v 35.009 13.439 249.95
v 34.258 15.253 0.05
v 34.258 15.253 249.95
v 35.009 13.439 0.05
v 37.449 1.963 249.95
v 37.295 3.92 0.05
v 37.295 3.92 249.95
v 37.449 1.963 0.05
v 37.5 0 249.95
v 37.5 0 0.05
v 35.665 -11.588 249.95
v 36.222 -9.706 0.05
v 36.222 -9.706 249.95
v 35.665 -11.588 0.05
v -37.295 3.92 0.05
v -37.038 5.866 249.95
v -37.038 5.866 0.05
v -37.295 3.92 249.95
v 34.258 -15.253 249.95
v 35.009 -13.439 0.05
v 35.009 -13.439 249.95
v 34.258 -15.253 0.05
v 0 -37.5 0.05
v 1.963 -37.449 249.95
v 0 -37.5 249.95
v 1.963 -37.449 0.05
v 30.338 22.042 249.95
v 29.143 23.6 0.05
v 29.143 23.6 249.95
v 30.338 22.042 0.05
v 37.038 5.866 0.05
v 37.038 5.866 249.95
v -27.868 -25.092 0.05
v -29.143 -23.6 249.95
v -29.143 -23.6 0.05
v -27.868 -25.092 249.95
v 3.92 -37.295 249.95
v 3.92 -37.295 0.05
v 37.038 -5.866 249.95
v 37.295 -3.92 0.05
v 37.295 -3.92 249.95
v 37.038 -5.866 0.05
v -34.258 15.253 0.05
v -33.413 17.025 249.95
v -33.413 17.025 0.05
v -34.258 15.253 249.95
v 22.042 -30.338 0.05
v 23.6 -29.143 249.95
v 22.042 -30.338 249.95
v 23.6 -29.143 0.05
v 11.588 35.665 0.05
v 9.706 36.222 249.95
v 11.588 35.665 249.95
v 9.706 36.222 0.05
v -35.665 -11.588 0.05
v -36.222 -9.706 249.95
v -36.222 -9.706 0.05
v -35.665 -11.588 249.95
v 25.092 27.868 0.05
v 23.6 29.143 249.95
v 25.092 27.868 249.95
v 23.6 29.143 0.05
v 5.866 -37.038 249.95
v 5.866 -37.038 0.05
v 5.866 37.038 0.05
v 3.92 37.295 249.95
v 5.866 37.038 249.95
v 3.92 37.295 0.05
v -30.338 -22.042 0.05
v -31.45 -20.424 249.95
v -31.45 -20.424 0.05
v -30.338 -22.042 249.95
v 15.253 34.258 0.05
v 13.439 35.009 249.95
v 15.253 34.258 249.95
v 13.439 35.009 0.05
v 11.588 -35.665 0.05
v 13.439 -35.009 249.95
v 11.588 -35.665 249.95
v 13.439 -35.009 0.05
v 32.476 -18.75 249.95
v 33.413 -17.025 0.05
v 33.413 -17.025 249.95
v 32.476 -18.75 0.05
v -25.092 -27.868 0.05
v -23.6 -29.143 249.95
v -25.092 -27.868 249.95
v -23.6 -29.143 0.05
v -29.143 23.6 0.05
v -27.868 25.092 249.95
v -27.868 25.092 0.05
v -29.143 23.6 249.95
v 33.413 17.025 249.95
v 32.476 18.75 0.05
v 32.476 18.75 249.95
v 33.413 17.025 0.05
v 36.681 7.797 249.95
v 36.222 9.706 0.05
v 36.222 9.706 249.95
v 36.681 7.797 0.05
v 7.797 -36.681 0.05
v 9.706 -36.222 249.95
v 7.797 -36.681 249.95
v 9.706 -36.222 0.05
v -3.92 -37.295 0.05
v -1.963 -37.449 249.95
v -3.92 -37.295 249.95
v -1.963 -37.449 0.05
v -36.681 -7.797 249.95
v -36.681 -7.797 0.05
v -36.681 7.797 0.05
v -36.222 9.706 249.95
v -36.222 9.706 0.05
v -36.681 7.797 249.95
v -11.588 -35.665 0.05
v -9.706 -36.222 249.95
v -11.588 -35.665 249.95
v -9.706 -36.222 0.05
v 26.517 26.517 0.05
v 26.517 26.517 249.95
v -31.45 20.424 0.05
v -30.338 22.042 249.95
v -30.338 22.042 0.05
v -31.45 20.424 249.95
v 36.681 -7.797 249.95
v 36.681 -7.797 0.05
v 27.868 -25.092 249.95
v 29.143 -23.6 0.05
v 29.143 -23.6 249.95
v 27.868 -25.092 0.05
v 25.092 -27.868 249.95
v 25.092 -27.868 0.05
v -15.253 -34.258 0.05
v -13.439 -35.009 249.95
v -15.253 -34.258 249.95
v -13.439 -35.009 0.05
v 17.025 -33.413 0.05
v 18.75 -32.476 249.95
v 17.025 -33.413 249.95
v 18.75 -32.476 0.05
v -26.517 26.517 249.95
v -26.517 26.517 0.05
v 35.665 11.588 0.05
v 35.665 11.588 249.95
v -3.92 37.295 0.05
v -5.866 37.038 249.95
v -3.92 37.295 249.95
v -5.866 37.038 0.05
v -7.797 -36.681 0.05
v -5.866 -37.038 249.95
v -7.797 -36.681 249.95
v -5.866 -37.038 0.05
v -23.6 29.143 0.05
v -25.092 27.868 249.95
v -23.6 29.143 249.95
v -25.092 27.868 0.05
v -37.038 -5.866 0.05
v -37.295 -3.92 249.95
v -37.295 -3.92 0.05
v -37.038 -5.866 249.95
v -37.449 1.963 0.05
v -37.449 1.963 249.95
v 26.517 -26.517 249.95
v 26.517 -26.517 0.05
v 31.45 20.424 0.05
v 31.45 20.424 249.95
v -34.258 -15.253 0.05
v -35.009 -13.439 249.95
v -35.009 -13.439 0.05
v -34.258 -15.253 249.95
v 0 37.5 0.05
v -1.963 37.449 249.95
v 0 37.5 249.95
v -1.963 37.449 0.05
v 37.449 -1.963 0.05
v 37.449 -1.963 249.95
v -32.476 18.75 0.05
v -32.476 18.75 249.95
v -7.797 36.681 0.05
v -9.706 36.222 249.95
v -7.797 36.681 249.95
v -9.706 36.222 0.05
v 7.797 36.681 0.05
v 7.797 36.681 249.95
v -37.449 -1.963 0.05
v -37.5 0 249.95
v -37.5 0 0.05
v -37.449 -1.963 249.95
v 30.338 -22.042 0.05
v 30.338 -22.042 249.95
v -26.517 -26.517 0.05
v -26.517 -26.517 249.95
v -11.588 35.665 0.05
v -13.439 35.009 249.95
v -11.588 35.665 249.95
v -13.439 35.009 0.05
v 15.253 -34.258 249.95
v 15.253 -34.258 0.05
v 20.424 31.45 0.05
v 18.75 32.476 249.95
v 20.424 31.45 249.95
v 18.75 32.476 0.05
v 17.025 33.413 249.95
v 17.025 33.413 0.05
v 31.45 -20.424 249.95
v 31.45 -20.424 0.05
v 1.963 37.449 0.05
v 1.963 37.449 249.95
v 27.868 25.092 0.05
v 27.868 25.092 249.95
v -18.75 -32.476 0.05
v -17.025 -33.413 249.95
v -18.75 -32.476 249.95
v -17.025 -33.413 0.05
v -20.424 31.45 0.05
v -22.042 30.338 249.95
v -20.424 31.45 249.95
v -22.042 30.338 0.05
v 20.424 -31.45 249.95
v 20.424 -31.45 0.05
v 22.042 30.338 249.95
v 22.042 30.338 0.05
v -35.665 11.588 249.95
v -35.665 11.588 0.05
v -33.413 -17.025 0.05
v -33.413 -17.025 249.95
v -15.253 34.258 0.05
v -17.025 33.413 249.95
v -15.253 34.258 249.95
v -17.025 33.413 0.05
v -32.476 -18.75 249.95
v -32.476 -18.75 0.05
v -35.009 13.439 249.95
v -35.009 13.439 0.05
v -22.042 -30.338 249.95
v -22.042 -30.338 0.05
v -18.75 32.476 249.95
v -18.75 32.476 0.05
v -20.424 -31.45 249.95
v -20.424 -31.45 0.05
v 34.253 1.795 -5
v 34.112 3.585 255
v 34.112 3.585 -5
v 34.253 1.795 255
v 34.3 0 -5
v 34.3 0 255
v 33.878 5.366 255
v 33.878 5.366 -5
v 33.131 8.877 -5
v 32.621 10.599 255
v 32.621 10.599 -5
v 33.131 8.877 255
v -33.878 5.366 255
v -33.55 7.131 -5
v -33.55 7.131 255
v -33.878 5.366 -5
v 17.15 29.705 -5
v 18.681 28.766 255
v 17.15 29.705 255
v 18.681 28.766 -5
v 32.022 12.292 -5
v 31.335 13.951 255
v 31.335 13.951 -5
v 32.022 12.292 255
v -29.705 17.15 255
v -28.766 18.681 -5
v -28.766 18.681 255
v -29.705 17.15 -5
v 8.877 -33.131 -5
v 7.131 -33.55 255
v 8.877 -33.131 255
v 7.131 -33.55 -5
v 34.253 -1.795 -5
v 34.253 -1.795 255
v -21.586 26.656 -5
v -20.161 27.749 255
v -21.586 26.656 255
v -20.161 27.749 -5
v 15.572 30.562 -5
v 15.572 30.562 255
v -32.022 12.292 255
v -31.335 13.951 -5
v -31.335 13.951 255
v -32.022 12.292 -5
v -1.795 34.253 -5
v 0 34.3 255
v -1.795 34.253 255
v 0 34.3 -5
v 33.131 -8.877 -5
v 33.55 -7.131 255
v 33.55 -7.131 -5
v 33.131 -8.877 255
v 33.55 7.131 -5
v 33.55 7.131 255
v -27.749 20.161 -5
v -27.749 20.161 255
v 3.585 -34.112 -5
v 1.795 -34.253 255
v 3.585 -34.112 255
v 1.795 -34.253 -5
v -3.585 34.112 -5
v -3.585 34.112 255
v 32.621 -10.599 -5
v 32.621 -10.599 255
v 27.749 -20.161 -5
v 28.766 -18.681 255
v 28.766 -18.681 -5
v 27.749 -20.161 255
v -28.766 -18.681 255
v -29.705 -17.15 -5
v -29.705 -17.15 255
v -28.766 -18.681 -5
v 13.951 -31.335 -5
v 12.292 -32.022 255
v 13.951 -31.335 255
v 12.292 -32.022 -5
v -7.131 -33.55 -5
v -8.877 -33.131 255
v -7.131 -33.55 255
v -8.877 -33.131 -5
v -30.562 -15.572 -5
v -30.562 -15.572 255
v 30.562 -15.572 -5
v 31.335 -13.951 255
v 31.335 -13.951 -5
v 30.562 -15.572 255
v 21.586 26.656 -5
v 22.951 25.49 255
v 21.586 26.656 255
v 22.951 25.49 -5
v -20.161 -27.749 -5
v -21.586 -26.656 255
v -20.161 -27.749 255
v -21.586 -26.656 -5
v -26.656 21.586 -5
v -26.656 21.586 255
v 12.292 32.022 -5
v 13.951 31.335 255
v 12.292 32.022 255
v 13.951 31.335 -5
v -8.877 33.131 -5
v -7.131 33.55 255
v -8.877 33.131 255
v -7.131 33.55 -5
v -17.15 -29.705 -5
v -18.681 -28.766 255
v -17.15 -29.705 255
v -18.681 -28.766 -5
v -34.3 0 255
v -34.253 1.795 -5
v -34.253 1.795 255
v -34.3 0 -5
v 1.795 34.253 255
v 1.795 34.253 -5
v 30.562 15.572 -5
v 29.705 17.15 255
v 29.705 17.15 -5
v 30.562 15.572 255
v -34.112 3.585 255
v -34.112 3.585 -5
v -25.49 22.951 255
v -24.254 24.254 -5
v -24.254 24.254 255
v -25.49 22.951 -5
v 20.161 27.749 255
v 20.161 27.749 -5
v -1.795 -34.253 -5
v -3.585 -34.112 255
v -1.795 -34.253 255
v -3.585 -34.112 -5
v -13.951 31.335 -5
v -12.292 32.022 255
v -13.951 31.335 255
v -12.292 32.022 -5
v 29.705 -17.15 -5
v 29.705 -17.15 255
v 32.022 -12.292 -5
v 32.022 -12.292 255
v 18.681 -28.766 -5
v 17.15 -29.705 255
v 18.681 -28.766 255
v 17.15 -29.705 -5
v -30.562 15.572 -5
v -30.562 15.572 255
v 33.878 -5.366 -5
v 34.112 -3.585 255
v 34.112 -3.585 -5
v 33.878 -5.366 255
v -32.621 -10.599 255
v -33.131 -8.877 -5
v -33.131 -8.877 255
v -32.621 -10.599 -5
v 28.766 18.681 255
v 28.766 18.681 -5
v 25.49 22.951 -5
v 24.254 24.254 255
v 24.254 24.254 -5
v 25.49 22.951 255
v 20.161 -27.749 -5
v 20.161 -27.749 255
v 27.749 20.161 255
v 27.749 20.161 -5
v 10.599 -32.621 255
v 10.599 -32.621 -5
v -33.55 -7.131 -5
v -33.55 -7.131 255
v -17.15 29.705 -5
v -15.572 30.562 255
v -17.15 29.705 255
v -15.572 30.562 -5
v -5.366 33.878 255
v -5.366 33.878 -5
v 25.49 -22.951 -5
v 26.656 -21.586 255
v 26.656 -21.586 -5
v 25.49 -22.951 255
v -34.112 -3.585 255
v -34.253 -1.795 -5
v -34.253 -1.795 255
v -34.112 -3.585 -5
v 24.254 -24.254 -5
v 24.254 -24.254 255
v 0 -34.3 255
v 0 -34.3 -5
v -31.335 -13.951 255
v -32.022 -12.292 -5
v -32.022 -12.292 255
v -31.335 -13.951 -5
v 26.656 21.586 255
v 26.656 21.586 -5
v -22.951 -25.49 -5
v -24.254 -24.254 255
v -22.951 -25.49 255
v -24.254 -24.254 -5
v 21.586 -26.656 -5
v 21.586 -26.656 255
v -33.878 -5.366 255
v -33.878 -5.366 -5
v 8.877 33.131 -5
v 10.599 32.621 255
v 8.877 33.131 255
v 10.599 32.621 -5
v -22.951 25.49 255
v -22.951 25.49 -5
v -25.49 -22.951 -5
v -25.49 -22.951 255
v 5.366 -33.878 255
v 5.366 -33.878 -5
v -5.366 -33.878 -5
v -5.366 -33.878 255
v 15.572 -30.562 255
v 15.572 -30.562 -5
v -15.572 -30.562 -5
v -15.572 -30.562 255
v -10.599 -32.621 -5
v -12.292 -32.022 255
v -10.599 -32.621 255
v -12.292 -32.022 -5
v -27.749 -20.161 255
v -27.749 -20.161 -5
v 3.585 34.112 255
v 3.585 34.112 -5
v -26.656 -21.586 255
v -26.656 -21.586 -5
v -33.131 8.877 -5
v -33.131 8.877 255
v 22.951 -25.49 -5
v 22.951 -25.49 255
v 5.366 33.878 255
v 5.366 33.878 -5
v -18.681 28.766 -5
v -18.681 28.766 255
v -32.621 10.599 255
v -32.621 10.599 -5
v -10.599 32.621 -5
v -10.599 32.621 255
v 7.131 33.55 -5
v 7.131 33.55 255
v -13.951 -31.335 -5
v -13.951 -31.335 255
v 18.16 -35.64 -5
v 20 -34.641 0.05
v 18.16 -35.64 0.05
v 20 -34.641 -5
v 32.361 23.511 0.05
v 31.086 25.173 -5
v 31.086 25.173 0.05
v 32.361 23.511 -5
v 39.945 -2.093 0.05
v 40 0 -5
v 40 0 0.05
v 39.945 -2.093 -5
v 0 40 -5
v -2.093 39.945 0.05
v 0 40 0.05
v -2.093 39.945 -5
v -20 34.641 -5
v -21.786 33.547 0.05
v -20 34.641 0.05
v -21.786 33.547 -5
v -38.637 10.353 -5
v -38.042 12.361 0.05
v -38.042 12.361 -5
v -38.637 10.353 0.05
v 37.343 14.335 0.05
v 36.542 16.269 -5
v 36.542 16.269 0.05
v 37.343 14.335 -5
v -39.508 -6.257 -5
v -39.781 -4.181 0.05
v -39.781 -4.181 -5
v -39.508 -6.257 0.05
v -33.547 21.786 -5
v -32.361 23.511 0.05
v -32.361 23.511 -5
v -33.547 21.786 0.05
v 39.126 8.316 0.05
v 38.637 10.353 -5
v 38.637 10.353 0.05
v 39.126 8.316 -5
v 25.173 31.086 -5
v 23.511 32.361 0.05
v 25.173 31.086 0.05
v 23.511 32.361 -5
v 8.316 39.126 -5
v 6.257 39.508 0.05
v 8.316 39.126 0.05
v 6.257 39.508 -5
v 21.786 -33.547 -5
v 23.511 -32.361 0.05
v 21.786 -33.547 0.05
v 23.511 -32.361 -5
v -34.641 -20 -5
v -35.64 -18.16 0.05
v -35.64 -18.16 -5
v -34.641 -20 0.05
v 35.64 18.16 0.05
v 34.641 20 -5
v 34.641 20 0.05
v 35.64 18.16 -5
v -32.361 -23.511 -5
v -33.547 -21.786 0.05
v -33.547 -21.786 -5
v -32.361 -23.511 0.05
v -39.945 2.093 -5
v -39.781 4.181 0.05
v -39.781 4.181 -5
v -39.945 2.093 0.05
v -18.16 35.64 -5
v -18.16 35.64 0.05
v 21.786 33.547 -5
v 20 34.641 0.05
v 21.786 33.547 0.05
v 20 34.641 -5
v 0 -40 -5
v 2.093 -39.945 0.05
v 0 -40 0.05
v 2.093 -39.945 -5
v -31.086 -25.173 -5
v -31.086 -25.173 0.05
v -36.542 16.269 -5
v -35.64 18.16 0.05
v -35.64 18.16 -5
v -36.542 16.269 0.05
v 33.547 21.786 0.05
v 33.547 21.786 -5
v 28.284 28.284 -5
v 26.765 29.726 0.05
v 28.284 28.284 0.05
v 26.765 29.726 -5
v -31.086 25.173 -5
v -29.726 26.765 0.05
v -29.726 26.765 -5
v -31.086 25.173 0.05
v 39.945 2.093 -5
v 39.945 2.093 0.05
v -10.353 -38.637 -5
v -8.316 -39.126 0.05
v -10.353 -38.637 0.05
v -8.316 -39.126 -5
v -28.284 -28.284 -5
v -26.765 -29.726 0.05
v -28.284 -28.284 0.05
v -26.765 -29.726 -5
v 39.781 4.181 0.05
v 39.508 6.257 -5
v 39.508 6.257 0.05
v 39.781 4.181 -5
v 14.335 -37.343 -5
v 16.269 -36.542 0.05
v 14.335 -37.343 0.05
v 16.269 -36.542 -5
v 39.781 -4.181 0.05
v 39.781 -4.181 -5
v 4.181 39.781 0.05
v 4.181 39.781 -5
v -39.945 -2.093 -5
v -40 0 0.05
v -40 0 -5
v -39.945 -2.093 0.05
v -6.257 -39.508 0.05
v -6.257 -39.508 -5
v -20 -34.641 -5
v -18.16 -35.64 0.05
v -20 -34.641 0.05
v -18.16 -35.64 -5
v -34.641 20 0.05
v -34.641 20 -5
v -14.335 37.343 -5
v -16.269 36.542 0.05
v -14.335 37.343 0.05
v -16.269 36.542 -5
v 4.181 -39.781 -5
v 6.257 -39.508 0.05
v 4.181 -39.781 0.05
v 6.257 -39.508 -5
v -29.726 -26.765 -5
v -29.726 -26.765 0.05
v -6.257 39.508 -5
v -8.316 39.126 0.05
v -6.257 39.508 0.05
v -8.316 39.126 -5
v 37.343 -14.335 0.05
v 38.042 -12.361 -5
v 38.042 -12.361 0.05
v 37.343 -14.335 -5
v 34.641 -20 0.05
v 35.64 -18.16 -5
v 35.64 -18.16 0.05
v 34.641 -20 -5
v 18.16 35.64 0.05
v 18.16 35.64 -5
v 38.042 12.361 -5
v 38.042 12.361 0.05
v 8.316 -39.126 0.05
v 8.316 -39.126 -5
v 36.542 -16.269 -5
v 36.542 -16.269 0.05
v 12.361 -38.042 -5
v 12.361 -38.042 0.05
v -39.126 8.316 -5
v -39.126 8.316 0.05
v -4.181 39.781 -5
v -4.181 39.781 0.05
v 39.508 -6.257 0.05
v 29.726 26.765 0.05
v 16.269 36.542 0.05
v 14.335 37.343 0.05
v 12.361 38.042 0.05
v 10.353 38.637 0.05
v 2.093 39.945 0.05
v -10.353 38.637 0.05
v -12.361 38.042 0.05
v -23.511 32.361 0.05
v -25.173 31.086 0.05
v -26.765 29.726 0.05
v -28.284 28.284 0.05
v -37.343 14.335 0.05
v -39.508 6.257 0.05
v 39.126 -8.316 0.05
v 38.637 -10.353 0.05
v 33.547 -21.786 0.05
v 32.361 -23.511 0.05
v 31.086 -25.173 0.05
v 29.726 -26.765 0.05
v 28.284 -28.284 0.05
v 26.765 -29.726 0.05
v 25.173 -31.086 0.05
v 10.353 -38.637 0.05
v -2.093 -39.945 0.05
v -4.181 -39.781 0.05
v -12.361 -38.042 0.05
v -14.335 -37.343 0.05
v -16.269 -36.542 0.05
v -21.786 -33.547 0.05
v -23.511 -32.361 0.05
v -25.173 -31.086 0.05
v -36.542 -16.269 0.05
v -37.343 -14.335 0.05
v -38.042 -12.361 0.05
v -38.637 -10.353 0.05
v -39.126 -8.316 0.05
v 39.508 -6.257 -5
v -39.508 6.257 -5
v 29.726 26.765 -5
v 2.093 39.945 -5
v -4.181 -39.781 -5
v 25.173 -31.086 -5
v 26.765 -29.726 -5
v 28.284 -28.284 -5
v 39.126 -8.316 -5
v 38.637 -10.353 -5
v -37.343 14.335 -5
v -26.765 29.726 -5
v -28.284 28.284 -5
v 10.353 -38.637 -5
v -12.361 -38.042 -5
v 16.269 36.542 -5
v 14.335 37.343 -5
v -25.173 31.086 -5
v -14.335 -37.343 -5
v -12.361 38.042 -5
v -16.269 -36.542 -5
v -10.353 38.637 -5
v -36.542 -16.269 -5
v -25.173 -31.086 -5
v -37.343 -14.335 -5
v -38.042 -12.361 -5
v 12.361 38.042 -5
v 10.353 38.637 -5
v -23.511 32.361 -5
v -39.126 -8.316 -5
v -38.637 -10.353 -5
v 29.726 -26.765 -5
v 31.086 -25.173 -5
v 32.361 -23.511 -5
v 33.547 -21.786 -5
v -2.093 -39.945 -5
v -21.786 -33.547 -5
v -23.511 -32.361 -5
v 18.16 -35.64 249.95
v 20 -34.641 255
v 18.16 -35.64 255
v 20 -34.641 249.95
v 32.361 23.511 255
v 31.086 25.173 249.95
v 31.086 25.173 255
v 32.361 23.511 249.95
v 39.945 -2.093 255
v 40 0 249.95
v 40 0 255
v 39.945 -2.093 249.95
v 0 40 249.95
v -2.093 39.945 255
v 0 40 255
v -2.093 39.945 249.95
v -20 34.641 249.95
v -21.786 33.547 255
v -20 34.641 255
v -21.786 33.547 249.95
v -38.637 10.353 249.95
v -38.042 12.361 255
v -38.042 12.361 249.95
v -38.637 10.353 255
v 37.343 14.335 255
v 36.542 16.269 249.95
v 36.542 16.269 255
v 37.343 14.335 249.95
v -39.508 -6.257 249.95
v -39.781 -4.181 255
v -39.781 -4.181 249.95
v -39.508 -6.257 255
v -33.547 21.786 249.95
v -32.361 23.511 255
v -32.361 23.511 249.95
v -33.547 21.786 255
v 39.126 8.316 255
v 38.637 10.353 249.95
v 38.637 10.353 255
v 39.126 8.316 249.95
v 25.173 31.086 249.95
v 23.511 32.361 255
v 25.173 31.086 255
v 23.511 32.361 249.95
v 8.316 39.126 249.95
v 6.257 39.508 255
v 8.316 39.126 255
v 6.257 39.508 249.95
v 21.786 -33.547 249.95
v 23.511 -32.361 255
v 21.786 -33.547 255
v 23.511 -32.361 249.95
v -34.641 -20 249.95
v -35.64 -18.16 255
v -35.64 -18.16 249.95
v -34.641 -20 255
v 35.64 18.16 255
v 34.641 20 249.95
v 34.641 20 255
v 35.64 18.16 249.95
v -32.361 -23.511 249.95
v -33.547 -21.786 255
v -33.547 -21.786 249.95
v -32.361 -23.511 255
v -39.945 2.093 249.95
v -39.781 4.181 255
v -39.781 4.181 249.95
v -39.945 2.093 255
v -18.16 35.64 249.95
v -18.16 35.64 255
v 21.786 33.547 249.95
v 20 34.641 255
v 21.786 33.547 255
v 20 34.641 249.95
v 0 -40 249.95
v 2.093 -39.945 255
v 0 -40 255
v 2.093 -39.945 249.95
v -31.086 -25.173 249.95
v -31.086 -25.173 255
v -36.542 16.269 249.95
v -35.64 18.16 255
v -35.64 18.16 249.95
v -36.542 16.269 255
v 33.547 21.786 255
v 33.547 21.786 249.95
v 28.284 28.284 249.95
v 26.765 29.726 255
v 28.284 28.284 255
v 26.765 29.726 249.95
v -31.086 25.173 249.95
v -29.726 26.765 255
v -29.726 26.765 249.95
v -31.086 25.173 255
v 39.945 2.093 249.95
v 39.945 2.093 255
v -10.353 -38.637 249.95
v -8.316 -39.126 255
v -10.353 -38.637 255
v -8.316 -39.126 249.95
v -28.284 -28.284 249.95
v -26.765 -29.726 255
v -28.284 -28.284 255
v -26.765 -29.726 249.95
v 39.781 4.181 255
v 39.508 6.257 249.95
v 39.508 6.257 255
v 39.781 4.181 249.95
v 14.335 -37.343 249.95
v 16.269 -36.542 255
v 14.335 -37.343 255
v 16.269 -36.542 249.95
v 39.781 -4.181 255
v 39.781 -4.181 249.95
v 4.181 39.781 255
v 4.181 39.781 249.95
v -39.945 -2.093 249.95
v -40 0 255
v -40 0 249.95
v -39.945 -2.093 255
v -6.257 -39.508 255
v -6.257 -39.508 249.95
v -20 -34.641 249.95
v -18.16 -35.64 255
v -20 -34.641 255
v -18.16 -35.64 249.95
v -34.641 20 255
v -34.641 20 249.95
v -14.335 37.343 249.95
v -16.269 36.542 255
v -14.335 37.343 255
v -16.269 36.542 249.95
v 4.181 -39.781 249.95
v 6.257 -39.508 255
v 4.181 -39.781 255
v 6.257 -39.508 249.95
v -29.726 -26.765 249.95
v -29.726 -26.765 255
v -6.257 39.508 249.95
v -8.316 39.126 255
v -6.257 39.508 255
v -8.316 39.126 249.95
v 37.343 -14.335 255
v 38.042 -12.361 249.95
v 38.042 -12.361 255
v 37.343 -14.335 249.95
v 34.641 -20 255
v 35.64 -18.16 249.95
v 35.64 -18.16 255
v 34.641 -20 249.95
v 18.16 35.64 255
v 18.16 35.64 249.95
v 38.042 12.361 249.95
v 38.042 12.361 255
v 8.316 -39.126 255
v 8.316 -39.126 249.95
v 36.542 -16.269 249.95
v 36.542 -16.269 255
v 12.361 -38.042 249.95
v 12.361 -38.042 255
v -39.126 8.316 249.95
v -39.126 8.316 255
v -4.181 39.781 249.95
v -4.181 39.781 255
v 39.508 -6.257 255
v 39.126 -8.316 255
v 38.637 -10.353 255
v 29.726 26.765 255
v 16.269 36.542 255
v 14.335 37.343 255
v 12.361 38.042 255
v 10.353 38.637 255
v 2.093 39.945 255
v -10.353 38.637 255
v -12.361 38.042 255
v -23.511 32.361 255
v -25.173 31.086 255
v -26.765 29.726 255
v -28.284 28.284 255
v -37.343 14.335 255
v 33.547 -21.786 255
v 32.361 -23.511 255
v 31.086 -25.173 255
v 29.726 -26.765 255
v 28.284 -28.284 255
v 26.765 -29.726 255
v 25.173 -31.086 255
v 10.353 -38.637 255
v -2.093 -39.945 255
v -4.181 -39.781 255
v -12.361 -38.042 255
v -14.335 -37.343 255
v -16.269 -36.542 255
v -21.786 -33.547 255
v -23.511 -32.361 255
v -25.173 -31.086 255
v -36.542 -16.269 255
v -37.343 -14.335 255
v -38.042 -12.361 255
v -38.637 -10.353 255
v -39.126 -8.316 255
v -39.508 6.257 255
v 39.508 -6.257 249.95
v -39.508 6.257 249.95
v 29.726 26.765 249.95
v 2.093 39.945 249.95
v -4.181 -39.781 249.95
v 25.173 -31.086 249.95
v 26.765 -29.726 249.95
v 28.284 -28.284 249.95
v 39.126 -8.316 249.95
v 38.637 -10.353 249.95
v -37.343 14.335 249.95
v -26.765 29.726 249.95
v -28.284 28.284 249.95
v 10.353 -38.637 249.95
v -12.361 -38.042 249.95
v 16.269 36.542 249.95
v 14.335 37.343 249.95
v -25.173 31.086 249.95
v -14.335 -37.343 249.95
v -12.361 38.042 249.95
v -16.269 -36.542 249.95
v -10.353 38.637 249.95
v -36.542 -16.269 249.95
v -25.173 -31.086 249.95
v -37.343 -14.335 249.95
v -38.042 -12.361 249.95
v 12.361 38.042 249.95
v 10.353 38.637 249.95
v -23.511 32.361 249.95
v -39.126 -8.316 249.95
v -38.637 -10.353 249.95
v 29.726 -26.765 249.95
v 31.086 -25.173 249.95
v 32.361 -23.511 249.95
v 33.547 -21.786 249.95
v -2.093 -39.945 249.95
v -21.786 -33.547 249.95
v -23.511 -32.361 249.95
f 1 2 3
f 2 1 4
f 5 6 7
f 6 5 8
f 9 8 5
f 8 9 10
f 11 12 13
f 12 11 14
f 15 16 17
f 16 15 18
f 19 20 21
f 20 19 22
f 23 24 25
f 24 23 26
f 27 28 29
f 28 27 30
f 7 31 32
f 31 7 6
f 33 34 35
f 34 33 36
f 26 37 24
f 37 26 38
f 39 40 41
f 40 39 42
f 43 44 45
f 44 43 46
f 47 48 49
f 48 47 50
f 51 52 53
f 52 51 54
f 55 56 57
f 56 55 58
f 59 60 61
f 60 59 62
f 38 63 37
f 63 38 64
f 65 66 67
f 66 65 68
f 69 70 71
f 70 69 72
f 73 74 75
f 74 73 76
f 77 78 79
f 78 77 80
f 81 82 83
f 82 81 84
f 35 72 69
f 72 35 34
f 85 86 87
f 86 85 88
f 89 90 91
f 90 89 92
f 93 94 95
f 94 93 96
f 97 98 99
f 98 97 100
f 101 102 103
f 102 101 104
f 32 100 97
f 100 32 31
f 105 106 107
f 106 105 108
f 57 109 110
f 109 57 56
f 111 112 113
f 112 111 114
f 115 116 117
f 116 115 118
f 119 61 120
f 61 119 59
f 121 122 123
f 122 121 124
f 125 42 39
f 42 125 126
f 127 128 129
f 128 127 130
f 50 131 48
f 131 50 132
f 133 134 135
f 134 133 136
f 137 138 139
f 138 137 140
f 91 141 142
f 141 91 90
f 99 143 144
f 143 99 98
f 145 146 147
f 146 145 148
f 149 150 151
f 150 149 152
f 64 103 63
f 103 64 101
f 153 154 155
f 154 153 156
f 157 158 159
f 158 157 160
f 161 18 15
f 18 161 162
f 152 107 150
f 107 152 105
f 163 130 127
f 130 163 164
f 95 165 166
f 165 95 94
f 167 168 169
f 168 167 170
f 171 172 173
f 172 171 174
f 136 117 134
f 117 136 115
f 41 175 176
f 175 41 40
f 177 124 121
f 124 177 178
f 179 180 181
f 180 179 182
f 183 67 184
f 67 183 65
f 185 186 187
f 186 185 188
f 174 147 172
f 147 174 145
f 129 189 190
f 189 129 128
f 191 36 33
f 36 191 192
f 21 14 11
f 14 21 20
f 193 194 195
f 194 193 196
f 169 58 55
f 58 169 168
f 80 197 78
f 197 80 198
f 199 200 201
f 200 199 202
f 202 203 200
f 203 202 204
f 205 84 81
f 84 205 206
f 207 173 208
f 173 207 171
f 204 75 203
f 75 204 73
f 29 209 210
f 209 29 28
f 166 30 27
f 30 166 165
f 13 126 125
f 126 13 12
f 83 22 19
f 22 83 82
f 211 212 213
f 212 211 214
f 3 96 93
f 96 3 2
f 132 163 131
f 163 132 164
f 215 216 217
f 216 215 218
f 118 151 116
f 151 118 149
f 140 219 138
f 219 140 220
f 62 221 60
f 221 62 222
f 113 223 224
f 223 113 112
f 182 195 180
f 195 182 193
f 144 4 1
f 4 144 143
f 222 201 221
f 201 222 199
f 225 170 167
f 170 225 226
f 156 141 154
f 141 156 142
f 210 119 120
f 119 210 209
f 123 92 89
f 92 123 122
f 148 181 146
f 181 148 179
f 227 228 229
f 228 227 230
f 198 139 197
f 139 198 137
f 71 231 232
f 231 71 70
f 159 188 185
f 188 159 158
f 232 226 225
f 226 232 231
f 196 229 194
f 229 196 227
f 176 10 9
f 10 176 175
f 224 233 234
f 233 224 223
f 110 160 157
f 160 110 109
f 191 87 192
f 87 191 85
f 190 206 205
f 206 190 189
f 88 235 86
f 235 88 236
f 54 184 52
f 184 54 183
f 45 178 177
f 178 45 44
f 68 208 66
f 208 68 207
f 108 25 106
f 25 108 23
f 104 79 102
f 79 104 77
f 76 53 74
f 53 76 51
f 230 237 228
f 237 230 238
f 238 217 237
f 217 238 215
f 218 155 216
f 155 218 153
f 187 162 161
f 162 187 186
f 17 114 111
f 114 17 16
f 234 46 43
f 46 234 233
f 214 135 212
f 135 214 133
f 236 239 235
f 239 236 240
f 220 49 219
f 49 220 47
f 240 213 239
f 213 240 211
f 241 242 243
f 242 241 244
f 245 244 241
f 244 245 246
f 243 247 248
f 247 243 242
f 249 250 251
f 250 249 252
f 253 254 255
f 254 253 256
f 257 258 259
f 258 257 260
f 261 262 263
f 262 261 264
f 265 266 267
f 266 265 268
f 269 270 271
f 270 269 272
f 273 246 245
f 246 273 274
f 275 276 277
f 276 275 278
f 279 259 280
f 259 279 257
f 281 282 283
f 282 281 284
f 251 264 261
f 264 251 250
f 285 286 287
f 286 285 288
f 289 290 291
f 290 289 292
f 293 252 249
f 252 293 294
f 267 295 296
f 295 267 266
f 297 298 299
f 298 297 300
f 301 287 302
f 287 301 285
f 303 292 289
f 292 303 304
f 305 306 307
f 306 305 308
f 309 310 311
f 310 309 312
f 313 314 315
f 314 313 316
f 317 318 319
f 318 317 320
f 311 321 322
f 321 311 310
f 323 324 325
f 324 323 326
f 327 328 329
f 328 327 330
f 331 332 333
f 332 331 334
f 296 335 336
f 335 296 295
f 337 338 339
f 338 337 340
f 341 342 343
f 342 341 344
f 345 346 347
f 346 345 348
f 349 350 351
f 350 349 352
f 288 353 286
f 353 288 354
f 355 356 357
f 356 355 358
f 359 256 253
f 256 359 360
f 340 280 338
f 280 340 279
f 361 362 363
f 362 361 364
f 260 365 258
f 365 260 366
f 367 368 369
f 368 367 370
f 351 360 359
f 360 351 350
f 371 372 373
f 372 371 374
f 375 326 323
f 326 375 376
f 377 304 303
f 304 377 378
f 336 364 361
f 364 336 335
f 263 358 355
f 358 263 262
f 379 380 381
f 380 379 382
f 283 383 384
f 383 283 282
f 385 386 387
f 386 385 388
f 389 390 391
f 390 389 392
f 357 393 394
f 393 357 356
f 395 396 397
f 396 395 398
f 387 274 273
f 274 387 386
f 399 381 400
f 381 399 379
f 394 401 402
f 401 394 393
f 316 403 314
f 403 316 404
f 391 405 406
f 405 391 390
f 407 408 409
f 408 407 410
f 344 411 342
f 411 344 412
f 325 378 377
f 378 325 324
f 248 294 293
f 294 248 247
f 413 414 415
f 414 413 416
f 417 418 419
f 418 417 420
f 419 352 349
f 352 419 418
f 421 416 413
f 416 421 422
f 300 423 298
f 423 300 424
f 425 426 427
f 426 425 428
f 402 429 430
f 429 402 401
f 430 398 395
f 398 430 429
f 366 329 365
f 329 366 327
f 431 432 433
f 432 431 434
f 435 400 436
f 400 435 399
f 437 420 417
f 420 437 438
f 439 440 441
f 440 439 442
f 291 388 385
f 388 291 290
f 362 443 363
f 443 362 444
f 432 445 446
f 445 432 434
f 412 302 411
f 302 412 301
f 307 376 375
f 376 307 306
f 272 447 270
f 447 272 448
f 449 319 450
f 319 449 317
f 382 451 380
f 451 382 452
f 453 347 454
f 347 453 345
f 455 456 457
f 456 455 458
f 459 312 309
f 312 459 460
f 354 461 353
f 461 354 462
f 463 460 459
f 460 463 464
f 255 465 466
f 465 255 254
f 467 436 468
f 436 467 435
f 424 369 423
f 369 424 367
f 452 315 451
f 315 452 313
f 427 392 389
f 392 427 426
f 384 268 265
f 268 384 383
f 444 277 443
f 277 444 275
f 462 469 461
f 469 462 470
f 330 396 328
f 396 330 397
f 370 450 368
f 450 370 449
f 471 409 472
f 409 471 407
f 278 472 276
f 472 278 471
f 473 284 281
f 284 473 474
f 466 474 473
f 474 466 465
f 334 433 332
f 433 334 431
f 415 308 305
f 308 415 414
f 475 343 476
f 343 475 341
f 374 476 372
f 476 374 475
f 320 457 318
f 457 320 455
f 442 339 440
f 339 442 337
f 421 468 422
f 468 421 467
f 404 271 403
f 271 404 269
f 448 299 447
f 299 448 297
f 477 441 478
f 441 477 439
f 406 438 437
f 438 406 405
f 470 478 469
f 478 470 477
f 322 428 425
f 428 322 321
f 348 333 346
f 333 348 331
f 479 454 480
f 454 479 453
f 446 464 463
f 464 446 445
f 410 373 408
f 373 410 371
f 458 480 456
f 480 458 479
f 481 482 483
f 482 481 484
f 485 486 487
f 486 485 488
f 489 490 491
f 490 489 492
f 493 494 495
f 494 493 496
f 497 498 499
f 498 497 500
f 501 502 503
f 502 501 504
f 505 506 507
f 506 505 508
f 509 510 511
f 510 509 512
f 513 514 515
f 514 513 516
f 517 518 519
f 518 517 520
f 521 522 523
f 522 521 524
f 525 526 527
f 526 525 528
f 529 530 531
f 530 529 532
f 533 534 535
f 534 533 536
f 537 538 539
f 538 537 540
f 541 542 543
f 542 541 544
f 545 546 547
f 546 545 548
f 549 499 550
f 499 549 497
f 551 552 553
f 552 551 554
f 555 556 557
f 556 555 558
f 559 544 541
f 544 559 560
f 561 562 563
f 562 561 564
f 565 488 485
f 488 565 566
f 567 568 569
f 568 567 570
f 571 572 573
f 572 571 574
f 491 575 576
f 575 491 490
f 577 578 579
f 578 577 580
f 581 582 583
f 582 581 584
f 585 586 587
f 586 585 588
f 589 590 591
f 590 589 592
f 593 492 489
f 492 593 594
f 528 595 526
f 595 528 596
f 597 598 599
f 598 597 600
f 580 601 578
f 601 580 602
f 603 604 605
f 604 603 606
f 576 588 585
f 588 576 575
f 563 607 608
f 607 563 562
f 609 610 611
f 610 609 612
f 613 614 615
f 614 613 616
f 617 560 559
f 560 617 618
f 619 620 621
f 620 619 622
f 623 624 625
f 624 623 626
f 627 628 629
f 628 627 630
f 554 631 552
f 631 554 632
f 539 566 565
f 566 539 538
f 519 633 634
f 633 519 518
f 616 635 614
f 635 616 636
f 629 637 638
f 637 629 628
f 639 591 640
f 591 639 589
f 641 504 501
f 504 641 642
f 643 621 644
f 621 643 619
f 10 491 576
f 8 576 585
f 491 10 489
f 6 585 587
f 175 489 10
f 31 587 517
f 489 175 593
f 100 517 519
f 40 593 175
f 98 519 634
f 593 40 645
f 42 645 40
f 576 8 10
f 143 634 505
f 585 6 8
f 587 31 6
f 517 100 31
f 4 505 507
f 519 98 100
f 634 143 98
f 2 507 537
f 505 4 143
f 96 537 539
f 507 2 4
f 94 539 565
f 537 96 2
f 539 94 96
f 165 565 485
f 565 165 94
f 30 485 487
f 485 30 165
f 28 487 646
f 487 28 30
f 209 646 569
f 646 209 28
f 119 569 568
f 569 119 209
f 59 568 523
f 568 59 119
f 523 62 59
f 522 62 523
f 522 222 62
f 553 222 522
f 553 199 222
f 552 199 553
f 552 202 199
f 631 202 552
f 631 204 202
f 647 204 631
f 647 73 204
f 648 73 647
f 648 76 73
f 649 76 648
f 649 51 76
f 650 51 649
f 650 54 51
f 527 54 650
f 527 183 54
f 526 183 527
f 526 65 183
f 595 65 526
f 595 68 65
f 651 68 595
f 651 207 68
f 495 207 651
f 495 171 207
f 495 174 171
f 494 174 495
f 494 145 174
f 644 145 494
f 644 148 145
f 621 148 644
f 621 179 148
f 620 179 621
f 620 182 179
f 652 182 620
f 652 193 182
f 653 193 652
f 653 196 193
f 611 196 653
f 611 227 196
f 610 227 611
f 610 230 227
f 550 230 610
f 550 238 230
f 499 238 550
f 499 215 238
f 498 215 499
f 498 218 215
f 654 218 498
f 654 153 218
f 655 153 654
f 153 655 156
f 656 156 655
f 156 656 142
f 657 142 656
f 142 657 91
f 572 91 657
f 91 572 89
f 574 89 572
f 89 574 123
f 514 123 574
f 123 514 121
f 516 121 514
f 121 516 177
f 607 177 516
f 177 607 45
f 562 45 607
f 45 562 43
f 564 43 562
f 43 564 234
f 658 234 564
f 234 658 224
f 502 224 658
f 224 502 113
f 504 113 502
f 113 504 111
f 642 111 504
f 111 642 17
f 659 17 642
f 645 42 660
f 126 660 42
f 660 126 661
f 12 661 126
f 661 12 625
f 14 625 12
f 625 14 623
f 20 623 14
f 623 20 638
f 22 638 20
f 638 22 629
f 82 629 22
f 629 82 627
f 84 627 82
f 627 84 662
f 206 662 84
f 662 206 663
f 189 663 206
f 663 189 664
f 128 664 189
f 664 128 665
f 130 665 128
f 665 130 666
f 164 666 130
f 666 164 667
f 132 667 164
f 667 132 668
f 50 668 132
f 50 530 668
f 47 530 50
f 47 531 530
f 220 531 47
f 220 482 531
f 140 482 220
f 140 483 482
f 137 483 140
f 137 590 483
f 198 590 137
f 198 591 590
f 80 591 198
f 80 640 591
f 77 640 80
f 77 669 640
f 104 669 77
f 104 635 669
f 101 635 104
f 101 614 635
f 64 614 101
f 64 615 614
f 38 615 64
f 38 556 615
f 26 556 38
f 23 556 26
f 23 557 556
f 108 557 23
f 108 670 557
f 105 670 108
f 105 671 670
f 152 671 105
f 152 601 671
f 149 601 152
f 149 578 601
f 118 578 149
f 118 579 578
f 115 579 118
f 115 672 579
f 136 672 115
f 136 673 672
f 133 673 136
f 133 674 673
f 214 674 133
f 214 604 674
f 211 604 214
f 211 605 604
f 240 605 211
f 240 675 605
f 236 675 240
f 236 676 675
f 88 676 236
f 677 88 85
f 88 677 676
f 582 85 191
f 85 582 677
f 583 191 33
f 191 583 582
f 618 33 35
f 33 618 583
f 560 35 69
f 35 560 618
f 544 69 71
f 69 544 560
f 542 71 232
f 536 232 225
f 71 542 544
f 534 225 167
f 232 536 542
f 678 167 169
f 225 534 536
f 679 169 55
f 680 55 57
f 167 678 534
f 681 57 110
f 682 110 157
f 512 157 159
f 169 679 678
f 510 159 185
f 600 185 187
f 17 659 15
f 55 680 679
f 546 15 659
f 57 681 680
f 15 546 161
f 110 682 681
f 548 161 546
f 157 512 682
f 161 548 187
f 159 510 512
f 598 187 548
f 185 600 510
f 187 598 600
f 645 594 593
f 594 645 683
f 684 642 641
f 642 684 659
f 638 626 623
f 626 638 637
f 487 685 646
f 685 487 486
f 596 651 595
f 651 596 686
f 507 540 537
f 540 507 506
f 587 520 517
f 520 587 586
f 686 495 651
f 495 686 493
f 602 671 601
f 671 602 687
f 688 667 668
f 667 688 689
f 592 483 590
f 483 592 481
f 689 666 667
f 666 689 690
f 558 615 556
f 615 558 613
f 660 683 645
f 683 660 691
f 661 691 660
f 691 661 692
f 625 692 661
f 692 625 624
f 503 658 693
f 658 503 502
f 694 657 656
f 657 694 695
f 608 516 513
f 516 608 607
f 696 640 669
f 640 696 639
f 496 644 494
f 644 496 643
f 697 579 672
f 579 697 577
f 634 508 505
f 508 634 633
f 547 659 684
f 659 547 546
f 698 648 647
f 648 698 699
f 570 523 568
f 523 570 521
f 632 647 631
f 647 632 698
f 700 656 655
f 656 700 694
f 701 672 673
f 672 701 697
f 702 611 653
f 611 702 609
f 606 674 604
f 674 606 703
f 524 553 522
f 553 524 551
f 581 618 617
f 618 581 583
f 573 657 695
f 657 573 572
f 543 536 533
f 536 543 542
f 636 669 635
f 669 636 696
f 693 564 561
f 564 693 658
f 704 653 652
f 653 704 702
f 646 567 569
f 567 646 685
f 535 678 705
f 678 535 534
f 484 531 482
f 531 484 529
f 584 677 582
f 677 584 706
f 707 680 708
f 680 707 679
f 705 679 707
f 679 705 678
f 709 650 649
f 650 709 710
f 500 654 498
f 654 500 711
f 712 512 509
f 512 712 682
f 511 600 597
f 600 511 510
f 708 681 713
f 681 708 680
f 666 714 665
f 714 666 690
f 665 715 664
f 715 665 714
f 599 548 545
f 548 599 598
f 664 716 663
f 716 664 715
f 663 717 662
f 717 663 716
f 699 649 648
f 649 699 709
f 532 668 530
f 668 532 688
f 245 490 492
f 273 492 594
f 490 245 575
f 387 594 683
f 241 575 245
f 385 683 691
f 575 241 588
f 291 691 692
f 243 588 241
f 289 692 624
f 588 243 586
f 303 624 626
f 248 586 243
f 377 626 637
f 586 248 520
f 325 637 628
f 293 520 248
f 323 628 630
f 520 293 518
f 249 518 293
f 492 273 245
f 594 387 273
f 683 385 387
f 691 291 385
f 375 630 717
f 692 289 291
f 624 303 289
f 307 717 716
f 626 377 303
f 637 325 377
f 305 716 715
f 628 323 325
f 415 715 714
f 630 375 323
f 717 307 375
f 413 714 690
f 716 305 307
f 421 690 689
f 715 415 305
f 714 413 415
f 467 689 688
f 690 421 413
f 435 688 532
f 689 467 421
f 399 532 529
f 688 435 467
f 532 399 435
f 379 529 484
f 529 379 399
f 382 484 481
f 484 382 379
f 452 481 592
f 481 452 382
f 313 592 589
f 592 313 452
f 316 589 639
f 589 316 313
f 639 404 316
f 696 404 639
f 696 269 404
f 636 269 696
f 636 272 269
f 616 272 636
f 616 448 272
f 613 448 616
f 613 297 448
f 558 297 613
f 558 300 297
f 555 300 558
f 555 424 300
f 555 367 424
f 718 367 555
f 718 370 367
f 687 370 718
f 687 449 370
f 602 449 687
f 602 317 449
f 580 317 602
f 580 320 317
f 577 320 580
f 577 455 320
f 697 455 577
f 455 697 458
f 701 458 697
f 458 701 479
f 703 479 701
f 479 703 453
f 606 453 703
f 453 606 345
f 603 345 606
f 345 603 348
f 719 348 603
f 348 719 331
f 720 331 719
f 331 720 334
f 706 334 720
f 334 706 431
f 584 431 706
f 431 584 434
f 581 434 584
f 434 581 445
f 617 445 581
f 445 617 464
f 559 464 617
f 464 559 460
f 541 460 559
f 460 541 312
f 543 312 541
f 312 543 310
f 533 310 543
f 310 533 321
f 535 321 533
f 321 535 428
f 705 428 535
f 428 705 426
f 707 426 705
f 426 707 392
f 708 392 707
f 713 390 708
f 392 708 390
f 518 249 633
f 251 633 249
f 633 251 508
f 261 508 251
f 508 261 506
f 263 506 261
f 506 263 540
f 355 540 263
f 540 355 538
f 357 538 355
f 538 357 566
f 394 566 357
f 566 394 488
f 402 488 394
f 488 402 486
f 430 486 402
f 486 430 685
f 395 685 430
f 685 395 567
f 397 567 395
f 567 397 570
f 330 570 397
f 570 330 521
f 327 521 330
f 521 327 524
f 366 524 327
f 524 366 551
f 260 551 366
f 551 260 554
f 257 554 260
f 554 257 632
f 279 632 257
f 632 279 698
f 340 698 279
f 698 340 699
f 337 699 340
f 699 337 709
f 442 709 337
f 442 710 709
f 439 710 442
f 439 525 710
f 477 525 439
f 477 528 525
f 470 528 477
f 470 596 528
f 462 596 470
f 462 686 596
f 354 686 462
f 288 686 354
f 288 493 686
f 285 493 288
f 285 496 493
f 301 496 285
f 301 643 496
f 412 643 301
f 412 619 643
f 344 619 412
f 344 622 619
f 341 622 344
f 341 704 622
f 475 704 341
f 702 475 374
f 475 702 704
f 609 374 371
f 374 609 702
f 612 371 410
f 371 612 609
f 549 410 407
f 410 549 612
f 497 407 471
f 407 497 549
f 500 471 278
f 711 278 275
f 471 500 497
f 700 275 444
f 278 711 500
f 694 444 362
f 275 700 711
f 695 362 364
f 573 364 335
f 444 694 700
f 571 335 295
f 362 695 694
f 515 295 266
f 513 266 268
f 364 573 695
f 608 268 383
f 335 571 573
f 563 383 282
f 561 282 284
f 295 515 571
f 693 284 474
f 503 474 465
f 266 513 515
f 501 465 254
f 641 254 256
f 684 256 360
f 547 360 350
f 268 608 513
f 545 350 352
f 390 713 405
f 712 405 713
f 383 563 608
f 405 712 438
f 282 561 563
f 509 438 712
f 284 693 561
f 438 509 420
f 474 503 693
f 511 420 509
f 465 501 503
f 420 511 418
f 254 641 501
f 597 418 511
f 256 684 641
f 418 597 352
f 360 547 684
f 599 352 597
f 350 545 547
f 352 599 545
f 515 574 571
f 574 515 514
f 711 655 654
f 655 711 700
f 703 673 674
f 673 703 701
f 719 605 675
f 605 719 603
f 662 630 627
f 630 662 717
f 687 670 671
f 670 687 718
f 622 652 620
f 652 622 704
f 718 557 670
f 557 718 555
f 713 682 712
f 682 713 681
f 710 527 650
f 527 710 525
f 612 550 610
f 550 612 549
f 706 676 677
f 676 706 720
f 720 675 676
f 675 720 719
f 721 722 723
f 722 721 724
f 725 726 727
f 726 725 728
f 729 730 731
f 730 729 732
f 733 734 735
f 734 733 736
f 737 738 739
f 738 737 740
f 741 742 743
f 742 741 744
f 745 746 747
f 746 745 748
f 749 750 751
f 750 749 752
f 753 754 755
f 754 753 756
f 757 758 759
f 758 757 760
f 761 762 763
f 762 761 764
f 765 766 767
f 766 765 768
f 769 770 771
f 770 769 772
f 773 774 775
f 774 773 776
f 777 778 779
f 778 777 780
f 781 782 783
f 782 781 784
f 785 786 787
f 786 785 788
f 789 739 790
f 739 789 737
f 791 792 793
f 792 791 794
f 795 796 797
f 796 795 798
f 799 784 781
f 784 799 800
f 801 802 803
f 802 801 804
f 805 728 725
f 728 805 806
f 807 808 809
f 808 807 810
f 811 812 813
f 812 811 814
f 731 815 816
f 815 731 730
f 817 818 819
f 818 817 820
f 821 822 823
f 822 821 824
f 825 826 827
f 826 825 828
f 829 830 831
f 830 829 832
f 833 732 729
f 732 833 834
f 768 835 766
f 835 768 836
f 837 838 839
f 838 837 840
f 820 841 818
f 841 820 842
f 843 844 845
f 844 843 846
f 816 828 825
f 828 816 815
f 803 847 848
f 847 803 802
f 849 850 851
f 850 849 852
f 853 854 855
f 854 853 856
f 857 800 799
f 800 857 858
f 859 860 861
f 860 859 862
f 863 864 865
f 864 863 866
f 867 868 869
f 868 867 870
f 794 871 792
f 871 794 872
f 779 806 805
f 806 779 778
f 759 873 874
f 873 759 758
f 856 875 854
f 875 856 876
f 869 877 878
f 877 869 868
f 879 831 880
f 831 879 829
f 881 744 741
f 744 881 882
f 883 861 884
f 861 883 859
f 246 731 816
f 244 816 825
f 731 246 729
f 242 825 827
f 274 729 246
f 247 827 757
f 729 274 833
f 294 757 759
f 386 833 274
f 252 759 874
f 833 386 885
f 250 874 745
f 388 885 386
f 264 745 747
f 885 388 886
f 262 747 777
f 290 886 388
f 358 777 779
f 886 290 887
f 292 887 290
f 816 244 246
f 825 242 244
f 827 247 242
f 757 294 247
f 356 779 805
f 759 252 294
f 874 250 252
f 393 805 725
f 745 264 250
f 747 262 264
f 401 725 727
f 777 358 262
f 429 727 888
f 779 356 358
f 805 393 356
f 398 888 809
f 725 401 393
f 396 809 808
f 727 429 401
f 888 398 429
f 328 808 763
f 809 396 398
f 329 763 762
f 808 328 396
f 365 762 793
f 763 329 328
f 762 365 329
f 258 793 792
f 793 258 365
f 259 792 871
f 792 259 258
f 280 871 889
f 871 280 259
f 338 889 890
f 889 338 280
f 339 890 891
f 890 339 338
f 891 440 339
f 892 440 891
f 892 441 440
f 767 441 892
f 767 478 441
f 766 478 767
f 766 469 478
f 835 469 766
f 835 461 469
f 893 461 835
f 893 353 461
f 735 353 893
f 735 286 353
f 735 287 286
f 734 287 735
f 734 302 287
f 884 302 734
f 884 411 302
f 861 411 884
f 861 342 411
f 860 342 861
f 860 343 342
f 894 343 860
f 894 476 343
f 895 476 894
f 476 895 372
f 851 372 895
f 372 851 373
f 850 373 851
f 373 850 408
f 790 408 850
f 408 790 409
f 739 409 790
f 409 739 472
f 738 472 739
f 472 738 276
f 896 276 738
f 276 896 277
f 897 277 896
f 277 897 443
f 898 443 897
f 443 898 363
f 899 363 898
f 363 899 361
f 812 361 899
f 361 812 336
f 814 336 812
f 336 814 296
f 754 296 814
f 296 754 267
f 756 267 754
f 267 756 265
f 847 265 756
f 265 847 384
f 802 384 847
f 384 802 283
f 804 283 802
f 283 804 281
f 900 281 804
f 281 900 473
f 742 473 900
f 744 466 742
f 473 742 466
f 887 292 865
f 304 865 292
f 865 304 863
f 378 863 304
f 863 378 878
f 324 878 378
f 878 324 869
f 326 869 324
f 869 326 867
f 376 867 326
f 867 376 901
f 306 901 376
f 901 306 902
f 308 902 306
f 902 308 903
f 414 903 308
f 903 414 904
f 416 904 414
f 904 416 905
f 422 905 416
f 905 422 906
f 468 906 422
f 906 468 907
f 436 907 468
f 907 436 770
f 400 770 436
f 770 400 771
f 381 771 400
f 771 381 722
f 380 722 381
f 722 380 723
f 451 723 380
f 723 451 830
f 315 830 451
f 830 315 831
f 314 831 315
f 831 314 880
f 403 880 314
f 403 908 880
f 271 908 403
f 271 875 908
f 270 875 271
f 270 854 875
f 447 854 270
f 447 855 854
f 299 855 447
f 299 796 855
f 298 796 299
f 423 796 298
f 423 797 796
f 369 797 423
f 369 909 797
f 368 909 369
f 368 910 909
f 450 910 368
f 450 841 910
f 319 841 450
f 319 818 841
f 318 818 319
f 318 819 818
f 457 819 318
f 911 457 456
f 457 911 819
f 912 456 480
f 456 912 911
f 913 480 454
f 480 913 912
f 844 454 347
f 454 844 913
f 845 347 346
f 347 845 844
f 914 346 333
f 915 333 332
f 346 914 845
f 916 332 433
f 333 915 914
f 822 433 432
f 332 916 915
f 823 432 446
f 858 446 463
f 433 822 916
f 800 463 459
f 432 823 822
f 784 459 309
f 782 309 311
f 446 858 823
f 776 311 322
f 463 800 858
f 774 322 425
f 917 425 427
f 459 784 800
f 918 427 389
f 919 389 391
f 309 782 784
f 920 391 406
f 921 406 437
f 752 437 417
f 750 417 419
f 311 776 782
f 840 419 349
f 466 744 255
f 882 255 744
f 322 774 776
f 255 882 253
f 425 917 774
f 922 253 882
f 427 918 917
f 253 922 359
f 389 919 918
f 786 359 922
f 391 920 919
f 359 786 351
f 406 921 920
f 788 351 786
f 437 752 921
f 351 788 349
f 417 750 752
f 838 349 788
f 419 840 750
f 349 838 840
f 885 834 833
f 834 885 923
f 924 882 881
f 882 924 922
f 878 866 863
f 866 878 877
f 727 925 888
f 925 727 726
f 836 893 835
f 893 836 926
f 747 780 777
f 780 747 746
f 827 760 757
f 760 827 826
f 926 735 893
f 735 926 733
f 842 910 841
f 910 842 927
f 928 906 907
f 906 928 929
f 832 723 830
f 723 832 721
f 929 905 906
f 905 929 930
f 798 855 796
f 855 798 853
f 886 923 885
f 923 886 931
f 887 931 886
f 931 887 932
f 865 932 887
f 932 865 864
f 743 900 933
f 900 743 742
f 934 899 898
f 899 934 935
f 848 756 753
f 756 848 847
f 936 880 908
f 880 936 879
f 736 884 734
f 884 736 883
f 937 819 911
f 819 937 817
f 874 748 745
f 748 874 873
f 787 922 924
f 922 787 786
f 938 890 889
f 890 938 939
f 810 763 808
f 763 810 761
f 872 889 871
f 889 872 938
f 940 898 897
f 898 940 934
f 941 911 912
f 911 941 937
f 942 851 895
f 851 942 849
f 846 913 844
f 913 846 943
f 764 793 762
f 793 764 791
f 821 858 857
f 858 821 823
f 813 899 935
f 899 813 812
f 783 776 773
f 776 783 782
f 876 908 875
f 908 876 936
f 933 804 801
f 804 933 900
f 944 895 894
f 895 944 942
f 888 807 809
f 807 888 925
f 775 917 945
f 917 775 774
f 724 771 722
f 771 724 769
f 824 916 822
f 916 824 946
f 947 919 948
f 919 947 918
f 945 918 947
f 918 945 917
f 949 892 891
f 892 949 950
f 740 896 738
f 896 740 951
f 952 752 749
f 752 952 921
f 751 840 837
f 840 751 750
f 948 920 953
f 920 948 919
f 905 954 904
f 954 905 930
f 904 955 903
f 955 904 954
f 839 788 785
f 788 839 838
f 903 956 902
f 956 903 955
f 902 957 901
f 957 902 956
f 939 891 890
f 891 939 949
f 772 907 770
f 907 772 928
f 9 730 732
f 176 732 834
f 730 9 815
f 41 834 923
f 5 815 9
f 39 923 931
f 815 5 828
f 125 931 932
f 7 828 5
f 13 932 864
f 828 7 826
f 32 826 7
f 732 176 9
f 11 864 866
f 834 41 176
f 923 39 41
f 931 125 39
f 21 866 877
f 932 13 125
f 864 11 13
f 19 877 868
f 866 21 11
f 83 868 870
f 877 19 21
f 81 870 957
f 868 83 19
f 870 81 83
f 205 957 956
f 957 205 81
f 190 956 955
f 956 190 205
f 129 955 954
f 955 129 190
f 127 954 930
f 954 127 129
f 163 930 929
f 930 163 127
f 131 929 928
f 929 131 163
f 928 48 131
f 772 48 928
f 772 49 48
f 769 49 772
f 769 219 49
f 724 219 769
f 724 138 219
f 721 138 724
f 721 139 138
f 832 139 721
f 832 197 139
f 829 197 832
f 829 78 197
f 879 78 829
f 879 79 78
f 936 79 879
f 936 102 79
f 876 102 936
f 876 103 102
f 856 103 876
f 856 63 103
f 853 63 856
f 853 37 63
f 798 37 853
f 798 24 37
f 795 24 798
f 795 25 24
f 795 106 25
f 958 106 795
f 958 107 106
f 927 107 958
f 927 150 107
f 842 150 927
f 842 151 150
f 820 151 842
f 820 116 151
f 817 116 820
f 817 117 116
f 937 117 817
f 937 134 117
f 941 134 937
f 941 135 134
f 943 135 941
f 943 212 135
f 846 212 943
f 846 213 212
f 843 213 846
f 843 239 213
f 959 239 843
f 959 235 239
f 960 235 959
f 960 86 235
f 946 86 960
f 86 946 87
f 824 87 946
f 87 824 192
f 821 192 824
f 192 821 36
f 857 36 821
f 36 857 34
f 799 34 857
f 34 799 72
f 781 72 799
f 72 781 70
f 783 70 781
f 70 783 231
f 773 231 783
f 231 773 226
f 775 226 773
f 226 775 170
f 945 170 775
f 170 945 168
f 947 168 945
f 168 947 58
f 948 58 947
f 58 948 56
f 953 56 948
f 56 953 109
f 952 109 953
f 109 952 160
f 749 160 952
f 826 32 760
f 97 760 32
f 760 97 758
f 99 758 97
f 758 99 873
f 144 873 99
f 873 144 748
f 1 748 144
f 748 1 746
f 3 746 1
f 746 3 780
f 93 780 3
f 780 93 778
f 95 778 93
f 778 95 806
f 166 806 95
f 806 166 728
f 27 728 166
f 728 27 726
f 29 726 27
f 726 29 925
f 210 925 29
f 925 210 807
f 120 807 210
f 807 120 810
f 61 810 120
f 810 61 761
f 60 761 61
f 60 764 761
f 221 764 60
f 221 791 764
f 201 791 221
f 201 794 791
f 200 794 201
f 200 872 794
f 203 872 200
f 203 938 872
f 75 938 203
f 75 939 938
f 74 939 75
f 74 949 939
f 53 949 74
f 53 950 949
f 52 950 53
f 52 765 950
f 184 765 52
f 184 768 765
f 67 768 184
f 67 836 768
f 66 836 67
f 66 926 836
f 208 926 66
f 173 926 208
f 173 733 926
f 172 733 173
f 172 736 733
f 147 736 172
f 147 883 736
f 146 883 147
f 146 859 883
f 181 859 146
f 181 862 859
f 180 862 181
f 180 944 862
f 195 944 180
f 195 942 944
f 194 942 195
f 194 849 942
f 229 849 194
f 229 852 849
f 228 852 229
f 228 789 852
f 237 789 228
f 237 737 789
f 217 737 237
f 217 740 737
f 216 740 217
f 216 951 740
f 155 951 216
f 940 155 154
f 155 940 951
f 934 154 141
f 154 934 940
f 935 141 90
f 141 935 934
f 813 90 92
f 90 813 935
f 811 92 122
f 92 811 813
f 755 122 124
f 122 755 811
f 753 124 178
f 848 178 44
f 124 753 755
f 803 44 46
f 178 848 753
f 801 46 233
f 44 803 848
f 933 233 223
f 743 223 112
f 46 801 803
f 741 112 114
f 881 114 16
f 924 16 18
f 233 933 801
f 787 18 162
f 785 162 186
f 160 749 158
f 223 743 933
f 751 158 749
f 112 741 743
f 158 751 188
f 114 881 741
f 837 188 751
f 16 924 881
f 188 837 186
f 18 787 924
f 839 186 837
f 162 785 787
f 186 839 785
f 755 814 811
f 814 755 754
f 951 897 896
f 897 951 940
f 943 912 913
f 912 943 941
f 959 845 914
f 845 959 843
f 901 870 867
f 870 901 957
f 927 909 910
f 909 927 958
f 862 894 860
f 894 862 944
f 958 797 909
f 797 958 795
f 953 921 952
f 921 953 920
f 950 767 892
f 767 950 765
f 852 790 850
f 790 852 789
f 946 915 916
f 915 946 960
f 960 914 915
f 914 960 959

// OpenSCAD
// HT 75 pipe 250 mm (single connected solid, hollow, with small end lips)

outer_diameter = 75;      // mm
wall_thickness = 3.2;     // mm
length = 250;             // mm

lip_height = 5;           // mm
lip_extra_d = 5;          // mm (adds to outer diameter)
eps = 0.05;               // small epsilon to avoid coplanar faces

$fn = 120;

module pipe_shell(h, d_out, t) {
    difference() {
        cylinder(h=h, d=d_out, center=false);
        translate([0, 0, -eps])
            cylinder(h=h + 2*eps, d=d_out - 2*t, center=false);
    }
}

module end_lip(h, d_out, extra_d, t) {
    // Ring that is hollow and overlaps the pipe wall (connected via union overlap)
    difference() {
        cylinder(h=h, d=d_out + extra_d, center=false);
        translate([0, 0, -eps])
            cylinder(h=h + 2*eps, d=d_out - 2*t, center=false);
    }
}

module ht_pipe() {
    union() {
        // Main pipe body
        pipe_shell(length, outer_diameter, wall_thickness);

        // Bottom lip: spans [-lip_height, 0] with a tiny overlap into the body
        translate([0, 0, -lip_height])
            end_lip(lip_height + eps, outer_diameter, lip_extra_d, wall_thickness);

        // Top lip: spans [length-eps, length+lip_height] with a tiny overlap into the body
        translate([0, 0, length - eps])
            end_lip(lip_height + eps, outer_diameter, lip_extra_d, wall_thickness);
    }
}

ht_pipe();
